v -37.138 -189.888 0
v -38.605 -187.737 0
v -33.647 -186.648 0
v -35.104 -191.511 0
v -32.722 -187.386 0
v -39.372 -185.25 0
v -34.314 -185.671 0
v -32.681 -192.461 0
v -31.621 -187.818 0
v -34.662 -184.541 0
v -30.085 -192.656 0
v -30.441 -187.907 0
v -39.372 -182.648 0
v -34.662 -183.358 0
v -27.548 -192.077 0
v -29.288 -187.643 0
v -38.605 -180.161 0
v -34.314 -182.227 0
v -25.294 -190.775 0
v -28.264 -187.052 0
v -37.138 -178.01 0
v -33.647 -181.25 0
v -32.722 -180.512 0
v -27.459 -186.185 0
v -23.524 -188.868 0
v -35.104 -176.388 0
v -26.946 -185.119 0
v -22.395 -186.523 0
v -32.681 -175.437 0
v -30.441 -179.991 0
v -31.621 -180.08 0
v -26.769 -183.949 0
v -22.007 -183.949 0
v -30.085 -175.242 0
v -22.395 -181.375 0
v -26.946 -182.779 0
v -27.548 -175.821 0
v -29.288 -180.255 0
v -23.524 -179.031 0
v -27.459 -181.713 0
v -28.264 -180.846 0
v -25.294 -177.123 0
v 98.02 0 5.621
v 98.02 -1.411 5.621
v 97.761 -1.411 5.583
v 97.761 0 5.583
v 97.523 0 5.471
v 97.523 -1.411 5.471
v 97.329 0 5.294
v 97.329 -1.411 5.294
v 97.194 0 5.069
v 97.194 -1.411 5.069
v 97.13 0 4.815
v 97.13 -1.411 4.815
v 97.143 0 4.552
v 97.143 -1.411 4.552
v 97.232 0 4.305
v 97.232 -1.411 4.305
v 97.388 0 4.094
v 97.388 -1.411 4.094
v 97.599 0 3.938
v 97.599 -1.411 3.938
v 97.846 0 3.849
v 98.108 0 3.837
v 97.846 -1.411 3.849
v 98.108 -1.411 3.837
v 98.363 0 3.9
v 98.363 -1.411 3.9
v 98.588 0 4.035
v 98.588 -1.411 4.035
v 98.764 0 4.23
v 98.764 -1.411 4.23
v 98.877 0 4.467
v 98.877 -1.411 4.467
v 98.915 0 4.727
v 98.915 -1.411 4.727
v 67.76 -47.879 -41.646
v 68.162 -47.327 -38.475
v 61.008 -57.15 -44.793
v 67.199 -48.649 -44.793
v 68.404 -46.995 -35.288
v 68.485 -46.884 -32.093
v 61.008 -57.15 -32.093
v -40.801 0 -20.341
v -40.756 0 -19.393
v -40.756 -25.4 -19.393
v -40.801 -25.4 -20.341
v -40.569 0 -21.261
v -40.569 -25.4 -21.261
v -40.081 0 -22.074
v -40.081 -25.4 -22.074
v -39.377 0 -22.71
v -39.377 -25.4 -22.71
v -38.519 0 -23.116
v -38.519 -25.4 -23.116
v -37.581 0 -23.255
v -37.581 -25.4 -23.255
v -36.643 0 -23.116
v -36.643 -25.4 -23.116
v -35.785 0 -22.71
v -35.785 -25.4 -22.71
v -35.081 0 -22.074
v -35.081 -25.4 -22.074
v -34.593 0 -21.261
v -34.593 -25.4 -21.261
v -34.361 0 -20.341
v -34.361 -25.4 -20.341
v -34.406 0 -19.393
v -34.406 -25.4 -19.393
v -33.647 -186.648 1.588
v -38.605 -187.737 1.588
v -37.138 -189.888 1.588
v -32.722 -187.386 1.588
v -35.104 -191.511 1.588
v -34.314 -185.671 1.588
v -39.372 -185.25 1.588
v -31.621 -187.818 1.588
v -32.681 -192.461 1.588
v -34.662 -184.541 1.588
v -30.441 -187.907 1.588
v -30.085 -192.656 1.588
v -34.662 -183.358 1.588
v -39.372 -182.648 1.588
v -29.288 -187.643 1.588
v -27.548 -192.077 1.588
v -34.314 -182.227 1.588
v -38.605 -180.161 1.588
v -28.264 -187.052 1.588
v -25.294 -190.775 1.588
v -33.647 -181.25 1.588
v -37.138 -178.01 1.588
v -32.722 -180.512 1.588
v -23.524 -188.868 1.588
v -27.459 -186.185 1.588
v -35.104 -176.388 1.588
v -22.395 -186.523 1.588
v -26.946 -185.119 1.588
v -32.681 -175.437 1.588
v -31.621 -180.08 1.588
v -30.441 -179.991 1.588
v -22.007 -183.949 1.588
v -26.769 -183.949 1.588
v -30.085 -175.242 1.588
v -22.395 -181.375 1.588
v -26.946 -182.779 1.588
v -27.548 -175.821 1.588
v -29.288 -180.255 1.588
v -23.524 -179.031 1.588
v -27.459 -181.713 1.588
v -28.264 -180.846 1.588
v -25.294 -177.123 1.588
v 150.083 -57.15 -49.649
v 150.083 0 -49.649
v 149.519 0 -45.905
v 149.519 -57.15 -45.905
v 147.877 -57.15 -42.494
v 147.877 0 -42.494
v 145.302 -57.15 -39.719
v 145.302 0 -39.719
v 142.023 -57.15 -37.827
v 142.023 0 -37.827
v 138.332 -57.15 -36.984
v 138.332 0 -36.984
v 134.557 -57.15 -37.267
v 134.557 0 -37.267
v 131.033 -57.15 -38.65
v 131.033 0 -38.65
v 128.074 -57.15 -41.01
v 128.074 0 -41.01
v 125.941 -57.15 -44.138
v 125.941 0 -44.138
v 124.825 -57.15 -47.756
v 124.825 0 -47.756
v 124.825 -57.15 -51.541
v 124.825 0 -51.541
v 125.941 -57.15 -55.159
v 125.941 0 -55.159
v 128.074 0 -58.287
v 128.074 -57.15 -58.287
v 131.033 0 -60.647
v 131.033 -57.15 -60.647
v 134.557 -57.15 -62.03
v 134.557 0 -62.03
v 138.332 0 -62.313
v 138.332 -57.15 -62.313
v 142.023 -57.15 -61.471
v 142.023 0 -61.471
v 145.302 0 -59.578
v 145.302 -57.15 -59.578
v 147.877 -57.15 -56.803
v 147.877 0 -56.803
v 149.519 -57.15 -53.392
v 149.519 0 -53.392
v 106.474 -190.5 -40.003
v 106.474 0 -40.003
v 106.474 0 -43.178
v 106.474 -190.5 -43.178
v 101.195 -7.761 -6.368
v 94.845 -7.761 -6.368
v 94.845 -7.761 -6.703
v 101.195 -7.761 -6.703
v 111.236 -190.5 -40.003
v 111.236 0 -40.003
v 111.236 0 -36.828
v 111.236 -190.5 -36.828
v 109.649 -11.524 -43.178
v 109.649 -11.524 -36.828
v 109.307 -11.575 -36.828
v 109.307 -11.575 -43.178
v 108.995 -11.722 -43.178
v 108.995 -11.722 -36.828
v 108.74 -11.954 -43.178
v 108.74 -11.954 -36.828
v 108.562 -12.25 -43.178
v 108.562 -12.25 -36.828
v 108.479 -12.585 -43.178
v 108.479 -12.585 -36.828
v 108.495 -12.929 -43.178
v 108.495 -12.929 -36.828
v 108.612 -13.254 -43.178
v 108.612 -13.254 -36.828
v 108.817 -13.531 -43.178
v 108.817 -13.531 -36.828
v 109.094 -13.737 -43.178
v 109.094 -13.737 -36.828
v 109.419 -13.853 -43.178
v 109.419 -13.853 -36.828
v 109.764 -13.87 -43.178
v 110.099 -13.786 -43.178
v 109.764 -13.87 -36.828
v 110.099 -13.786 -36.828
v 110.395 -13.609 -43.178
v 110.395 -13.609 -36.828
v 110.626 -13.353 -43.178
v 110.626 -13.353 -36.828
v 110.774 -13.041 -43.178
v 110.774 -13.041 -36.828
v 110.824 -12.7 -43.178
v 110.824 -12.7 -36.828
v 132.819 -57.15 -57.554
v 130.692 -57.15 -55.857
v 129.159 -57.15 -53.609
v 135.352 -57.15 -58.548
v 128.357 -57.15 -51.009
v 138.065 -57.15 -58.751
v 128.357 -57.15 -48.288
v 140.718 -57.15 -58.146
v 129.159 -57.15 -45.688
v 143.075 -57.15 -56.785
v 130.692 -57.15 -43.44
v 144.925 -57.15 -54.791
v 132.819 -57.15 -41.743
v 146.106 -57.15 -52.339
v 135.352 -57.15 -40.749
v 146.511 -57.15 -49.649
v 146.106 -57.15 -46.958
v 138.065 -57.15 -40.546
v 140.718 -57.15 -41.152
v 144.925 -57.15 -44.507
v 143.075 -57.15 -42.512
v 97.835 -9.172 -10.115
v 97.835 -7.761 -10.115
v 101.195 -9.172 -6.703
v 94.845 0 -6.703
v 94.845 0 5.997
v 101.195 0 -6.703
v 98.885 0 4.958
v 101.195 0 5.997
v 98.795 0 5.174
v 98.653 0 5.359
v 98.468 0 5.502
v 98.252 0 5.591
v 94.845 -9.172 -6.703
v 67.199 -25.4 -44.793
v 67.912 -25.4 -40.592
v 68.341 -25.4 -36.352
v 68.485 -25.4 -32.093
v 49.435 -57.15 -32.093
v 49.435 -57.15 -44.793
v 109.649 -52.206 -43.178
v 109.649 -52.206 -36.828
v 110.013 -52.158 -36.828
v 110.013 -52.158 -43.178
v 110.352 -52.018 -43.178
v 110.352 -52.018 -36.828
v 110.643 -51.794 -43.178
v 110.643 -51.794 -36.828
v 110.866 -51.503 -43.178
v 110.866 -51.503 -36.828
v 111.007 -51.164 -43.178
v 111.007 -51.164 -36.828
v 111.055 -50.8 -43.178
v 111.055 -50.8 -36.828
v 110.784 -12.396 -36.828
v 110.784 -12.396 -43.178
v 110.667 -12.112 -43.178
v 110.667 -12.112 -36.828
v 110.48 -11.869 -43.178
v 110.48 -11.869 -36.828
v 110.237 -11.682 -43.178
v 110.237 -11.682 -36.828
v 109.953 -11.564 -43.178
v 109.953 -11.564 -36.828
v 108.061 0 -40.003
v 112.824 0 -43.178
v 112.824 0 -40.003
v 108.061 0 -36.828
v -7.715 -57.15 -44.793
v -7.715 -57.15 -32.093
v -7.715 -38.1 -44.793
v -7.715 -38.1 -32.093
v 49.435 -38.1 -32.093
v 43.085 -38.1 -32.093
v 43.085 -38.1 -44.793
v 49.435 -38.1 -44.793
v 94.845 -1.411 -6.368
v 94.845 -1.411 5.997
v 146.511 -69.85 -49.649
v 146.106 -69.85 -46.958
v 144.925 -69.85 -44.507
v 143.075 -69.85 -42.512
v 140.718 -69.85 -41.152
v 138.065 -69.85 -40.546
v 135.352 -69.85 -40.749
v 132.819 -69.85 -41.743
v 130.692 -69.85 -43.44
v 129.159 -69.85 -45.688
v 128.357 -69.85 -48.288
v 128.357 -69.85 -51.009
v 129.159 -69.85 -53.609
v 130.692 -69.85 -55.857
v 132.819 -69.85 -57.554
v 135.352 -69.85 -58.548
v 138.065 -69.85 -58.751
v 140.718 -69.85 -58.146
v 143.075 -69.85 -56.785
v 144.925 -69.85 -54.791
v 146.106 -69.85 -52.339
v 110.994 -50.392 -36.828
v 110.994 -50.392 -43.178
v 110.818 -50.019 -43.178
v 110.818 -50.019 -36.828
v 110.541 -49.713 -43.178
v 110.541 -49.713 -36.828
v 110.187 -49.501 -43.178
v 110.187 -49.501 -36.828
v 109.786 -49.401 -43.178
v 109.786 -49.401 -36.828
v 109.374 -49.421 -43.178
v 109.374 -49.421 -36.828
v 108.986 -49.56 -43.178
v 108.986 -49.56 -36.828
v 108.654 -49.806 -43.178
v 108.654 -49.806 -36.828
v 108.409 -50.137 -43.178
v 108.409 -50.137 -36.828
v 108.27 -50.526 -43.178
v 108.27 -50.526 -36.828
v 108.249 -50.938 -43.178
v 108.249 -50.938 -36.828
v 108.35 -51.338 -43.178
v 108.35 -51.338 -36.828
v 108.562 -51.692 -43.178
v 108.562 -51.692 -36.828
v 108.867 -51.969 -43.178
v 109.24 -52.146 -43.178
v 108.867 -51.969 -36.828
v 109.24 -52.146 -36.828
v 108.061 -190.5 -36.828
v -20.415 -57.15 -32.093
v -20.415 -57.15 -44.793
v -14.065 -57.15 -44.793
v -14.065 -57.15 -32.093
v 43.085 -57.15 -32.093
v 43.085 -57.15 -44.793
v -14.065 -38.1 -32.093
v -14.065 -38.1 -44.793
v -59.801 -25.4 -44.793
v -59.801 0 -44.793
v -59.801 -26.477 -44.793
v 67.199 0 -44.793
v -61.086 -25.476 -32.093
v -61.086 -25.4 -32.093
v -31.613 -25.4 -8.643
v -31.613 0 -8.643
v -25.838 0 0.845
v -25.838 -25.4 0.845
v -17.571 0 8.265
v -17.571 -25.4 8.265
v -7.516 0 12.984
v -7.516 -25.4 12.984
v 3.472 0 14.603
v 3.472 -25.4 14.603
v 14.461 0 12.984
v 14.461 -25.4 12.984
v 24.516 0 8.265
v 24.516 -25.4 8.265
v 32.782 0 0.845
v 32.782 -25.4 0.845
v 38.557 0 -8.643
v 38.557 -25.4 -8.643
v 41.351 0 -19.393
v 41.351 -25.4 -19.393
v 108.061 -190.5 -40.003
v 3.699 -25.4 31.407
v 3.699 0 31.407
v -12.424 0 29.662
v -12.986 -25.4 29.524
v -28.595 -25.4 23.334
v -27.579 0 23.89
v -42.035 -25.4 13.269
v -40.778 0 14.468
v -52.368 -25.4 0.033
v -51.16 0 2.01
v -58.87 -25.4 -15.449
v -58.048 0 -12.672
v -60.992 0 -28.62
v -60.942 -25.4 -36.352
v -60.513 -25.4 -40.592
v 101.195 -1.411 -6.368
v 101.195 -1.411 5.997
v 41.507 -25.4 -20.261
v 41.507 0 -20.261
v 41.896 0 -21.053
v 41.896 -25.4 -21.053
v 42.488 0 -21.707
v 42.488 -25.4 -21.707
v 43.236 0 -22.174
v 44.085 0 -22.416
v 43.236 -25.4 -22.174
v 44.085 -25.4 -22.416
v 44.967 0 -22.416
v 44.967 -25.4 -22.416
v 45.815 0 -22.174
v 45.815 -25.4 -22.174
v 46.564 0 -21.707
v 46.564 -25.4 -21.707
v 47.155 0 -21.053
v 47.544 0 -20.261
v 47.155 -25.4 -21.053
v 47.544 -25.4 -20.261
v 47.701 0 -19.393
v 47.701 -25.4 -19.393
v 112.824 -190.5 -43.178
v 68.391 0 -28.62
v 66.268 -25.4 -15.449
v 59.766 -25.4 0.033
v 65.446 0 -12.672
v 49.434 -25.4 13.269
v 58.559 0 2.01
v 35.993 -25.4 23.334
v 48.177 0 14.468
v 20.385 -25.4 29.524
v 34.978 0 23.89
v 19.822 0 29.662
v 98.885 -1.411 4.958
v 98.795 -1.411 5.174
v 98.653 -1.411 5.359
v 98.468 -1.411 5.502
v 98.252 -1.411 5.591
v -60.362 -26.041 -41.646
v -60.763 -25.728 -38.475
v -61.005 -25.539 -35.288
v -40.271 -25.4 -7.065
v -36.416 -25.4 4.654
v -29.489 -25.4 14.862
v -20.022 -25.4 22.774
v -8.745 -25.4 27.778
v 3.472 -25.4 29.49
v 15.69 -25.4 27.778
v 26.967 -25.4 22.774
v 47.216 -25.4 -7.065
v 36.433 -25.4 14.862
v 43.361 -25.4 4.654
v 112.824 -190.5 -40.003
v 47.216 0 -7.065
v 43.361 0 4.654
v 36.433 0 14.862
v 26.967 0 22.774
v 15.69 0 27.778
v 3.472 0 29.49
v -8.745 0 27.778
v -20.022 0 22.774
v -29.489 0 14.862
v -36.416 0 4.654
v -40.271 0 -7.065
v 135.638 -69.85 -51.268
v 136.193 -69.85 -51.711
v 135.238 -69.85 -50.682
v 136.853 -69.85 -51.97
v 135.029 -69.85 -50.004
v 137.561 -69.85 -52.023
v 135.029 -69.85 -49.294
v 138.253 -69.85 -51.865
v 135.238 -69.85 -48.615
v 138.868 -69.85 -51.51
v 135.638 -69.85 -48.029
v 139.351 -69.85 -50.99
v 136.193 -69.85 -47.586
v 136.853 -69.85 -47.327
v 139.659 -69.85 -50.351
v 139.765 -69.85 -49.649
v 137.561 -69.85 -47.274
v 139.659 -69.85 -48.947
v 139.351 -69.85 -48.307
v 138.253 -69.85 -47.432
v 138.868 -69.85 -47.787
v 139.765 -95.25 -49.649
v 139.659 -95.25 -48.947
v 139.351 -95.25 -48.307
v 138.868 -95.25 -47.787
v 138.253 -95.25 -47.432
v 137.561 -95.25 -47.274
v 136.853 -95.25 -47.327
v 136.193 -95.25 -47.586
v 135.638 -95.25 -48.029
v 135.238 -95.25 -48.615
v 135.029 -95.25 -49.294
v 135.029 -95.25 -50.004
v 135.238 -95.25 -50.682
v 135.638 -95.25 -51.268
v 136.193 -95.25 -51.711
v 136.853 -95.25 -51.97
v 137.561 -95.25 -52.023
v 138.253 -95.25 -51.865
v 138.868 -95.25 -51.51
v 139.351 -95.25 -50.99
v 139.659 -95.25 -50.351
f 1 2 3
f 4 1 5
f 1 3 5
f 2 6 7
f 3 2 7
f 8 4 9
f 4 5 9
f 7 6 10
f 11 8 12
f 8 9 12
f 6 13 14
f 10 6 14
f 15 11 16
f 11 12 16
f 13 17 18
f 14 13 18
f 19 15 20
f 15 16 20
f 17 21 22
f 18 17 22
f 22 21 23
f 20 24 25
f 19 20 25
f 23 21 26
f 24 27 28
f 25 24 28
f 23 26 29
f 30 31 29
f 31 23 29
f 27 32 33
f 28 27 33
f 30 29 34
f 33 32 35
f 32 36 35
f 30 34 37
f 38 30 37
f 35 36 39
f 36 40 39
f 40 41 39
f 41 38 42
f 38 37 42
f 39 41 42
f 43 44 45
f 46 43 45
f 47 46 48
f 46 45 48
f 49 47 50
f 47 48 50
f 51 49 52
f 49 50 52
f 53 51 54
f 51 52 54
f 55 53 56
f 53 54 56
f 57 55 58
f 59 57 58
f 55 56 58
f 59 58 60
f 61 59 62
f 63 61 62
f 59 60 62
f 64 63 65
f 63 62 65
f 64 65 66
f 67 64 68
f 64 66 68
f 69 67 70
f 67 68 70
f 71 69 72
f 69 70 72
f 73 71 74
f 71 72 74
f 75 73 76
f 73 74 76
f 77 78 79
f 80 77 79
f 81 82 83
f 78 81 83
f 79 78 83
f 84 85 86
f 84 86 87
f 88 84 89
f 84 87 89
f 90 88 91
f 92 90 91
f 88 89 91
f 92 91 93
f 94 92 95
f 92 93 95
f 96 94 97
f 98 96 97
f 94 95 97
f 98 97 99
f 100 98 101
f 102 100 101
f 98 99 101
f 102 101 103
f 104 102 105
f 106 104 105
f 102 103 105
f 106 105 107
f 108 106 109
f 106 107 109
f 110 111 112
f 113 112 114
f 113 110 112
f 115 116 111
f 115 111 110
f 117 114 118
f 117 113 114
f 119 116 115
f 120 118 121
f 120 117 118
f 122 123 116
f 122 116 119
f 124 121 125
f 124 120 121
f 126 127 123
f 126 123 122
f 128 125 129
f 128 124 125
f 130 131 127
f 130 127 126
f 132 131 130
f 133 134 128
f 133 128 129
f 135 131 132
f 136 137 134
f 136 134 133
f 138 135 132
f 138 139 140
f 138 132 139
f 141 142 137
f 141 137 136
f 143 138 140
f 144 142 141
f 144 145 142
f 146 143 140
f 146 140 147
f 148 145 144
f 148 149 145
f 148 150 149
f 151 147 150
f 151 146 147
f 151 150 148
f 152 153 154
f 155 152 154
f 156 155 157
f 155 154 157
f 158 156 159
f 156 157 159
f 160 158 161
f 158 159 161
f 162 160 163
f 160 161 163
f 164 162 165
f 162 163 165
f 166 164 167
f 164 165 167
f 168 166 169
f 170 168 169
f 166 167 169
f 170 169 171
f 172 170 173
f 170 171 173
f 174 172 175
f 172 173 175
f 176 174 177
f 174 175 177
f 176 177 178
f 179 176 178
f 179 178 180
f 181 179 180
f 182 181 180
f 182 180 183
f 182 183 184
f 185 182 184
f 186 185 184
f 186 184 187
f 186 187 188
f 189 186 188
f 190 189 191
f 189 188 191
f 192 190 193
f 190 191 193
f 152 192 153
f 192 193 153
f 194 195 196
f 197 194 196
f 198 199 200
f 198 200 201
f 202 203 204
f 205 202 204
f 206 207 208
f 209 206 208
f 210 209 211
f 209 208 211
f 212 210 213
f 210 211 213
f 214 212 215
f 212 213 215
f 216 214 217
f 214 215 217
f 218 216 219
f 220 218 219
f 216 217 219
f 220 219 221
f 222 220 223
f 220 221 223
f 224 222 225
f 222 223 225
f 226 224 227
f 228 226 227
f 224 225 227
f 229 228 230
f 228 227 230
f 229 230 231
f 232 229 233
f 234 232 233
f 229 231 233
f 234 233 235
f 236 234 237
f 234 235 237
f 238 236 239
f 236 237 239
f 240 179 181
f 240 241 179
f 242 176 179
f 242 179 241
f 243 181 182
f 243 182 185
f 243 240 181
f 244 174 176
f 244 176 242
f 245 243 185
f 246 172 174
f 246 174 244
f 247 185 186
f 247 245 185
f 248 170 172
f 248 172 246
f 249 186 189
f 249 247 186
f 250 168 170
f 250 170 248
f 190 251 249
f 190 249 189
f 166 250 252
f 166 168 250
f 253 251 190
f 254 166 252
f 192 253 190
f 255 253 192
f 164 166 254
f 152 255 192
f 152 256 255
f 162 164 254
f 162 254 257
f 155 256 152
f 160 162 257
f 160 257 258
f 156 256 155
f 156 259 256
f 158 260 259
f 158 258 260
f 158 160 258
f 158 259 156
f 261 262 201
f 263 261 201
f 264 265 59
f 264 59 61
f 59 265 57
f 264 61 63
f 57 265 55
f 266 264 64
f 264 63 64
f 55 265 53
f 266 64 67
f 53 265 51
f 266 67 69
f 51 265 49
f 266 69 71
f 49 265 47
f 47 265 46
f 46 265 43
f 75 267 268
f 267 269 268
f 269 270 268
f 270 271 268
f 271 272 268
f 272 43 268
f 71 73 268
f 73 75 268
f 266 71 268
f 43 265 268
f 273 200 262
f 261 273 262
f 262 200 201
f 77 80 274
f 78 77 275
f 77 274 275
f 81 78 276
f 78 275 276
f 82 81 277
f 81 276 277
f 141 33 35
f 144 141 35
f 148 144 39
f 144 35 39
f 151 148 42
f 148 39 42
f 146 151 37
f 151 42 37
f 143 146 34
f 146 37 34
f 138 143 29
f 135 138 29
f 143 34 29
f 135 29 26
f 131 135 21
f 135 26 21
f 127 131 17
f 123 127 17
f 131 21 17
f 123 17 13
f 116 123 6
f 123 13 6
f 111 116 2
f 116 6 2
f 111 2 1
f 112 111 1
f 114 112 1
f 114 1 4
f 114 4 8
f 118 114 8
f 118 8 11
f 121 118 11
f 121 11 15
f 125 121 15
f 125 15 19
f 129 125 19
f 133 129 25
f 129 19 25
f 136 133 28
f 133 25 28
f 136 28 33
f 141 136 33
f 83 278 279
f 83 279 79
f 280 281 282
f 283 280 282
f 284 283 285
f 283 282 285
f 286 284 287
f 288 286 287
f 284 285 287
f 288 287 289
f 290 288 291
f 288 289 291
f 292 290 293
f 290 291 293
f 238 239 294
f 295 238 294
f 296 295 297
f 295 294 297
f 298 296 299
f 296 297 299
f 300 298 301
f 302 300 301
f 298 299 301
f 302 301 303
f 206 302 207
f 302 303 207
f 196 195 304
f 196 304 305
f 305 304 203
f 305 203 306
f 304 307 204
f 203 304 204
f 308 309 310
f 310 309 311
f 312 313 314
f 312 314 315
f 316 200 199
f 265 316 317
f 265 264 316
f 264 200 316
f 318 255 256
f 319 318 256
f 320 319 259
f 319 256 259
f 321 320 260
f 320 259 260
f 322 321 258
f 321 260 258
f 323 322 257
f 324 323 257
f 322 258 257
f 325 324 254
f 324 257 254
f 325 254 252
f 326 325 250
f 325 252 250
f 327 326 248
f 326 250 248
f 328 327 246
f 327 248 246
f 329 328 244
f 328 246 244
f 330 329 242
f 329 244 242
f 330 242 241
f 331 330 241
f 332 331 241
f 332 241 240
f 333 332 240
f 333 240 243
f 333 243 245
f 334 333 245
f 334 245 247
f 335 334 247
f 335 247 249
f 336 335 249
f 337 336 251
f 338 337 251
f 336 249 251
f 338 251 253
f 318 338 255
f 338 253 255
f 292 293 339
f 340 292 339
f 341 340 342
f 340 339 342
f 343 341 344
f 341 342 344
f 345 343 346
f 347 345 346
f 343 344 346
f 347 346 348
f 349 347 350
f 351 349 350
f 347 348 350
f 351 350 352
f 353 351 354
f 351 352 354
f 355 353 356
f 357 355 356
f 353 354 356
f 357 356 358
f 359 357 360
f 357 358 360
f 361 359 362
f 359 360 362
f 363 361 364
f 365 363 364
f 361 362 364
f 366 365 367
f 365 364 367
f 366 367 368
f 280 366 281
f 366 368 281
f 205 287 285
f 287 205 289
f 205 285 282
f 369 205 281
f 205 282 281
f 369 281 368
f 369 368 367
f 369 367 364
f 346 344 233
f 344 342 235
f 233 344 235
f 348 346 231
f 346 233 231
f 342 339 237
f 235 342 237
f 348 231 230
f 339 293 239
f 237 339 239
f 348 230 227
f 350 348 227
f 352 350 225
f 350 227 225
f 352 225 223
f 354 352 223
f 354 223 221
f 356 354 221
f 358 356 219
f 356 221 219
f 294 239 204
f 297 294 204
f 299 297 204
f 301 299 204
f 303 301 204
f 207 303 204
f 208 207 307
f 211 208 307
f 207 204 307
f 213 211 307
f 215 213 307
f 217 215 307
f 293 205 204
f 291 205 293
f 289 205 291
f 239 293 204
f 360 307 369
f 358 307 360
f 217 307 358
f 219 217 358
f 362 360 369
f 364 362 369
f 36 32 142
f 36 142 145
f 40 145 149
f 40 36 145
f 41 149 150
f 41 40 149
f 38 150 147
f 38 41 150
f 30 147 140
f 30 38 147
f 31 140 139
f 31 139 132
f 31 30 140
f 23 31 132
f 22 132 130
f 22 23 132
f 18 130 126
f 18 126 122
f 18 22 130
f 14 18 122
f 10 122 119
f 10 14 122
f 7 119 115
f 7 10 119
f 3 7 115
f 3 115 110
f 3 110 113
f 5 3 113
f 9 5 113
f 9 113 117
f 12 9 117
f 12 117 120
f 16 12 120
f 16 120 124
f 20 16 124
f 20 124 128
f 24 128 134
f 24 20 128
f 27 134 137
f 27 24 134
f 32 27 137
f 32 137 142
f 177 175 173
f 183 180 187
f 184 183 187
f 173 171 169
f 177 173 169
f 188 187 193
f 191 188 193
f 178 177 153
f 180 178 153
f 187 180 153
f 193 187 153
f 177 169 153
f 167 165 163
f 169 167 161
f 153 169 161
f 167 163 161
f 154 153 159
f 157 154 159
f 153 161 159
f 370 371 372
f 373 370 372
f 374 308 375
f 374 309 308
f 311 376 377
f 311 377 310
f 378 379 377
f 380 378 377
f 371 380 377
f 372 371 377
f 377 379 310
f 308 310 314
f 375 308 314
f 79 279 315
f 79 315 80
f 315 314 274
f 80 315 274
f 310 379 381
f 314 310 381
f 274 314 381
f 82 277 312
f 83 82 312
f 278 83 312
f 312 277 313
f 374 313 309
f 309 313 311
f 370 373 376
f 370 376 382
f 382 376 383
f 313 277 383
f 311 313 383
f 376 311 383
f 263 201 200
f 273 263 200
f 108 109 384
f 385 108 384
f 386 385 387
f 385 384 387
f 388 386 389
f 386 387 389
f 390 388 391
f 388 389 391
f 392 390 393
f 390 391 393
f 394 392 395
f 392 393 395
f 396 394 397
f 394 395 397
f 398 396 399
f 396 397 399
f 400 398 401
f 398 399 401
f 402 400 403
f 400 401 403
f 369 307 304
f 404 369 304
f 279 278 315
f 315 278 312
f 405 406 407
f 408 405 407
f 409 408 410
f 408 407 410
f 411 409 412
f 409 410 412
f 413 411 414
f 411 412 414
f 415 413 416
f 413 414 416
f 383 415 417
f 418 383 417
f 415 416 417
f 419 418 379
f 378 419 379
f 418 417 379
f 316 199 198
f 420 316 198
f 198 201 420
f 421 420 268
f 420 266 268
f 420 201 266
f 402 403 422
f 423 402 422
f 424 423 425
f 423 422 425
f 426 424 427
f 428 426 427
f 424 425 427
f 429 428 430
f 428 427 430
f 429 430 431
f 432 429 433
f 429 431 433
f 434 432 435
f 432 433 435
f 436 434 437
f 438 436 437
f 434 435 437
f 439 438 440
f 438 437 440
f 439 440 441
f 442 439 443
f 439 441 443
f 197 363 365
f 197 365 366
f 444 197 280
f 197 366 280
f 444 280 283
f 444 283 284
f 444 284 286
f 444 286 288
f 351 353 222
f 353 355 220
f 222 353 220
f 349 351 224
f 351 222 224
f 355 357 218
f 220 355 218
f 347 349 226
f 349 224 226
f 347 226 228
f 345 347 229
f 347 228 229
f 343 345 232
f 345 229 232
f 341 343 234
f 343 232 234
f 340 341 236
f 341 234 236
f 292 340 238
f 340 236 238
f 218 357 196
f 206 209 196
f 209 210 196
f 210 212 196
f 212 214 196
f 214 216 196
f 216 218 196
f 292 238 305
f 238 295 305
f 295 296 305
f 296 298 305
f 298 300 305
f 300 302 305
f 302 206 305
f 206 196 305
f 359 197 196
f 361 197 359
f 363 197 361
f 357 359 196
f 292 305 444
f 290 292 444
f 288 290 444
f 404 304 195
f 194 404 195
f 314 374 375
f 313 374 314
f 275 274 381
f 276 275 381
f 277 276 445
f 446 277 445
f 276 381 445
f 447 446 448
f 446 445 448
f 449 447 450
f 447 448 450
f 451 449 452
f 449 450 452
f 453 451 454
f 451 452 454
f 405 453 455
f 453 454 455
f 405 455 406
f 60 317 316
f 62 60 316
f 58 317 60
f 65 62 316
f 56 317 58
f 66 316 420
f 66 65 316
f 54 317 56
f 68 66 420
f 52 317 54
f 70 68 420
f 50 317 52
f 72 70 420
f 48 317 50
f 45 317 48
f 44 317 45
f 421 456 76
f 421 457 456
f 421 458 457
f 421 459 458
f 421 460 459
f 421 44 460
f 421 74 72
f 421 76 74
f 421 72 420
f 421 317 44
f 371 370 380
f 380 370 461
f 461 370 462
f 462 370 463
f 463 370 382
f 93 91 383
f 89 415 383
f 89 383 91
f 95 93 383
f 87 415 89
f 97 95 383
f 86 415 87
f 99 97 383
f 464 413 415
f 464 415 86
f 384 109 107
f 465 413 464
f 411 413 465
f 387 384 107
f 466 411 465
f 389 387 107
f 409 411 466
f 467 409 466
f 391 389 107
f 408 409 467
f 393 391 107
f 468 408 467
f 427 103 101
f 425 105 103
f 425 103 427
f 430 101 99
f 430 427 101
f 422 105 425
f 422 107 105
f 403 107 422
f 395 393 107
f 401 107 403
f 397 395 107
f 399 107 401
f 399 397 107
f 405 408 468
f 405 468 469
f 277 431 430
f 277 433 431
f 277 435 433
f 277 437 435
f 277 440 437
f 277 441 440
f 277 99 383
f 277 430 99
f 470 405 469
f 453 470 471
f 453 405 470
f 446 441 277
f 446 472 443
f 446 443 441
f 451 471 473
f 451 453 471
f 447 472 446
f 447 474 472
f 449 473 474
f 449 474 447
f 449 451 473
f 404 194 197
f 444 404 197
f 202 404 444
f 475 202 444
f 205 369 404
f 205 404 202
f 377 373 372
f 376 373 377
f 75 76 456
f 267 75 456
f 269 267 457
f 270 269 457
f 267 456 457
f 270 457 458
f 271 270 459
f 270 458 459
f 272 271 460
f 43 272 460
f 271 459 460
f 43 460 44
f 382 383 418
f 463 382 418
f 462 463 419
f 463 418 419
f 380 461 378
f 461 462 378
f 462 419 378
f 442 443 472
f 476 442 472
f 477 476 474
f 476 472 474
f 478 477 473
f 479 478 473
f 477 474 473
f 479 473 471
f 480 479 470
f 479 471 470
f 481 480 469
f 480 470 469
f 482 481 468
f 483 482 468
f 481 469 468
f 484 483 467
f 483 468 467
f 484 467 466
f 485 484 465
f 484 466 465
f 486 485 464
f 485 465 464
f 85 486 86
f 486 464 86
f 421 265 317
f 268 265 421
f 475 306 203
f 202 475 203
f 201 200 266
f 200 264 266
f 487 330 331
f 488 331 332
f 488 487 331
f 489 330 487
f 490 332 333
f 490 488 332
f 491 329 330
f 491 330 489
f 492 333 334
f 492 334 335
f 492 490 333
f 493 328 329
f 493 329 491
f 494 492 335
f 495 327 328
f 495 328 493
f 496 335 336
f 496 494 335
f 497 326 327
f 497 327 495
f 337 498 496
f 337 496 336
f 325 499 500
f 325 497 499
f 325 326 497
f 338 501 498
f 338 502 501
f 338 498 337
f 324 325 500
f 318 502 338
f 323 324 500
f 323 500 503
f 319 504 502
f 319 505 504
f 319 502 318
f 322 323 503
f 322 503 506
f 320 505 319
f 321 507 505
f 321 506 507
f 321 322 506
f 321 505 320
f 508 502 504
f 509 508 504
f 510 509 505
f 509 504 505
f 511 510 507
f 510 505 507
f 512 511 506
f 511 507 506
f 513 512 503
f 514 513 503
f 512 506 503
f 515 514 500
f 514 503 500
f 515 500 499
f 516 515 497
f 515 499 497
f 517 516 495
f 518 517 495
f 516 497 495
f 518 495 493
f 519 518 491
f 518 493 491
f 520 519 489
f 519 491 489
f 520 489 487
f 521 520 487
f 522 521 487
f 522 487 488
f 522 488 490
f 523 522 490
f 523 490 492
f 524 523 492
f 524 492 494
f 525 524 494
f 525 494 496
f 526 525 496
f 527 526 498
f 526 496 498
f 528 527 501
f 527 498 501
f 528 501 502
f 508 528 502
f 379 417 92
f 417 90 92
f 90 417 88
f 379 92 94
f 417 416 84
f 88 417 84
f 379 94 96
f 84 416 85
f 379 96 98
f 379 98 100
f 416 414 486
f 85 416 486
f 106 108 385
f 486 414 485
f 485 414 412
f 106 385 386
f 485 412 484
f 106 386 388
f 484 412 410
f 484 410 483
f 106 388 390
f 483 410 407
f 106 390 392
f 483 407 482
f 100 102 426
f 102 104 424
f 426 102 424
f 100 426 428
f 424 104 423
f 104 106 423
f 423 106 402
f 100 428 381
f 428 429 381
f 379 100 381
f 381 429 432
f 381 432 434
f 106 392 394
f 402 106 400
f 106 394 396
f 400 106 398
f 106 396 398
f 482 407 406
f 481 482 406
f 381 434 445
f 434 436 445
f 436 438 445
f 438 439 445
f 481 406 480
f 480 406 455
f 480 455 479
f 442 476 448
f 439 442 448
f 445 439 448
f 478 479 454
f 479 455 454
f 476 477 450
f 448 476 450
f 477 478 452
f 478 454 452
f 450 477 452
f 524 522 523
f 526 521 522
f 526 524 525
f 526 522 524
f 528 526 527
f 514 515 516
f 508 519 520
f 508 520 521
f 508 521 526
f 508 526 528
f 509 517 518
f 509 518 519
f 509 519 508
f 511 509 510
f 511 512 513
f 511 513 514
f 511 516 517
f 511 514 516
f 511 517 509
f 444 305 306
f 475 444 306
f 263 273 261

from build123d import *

# Parameters (mm, degrees)
F1_DEPTH  = 25.4
F3_DEPTH  = 31.75
F4_W      = 6.35
F4_H      = 19.05
F5_DEPTH  = 25.4
F7_DEPTH  = 25.4
F9_DEPTH  = 190.5
F11_DEPTH = 25.4
F13_DEPTH = 25.4
F14_R     = 12.7
F15_DEPTH = 57.15
F16_R     = 9.128125
F17_DEPTH = 12.7
F18_R     = 2.38125
F19_DEPTH = 25.4
F21_DEPTH = 25.4
F22_R     = 8.73125
F22_R_2   = 3.96875
F23_DEPTH = 1.5875
F24_W     = 6.35
F24_H     = 12.7
F25_DEPTH = 1.4111111111
F26_W     = 6.35
F26_H     = 0.3355476074
F27_DEPTH = 6.35
F29_DEPTH = 1.4111111111
F31_DEPTH = 25.4
F33_DEPTH = 25.4


with BuildPart() as f1:
    # F0 (on Front) → F1 (new body)
    with BuildSketch(Plane.XZ):
        with BuildLine():
            ThreePointArc((3.6992596686, 31.4069082856), (-46.3684103417, 8.5716332942), (-59.8007403314, -44.7930917144))
            Line((-59.8007403314, -44.7930917144), (3.6992596686, -44.7930917144))
            Line((3.6992596686, -44.7930917144), (3.6992596686, 31.4069082856))
        make_face()
        with BuildLine():
            Line((3.6992596686, 31.4069082856), (3.6992596686, -44.7930917144))
            Line((3.6992596686, -44.7930917144), (67.1992596686, -44.7930917144))
            ThreePointArc((67.1992596686, -44.7930917144), (53.7669296789, 8.5716332942), (3.6992596686, 31.4069082856))
        make_face()
    extrude(amount=F1_DEPTH)

    # F2 (on face) → F3 (join)
    with BuildSketch(Plane.XZ.offset(25.4)):
        with BuildLine():
            Line((3.6992596686, -32.0930917144), (3.6992596686, -44.7930917144))
            Line((3.6992596686, -44.7930917144), (67.1992596686, -44.7930917144))
            ThreePointArc((67.1992596686, -44.7930917144), (68.162001096, -38.4754784131), (68.4848770905, -32.0930917144))
            Line((68.4848770905, -32.0930917144), (3.6992596686, -32.0930917144))
        make_face()
        with BuildLine():
            Line((-59.8007403314, -44.7930917144), (3.6992596686, -44.7930917144))
            Line((3.6992596686, -44.7930917144), (3.6992596686, -32.0930917144))
            Line((3.6992596686, -32.0930917144), (-61.0863577533, -32.0930917144))
            ThreePointArc((-61.0863577533, -32.0930917144), (-60.7634817588, -38.4754784131), (-59.8007403314, -44.7930917144))
        make_face()
    extrude(amount=F3_DEPTH)

    # F4 (on face) → F5 (cut)
    with BuildSketch(Plane.XY.offset(-32.0930917144)):
        with Locations((-10.8901229095, -47.625)):
            Rectangle(F4_W, F4_H)
        with Locations((46.2598770905, -47.625)):
            Rectangle(F4_W, F4_H)
    extrude(amount=-F5_DEPTH, mode=Mode.SUBTRACT)

    # F6 (on face) → F7 (cut)
    with BuildSketch(Plane.XY.offset(-32.0930917144)):
        Polygon((-61.0863577533, -57.15), (-20.4151229095, -57.15), (-61.0863577533, -25.4762284458), align=None)
    extrude(amount=-F7_DEPTH, mode=Mode.SUBTRACT)

    # F10 (on face) → F11 (cut)
    with BuildSketch(Plane.XZ.offset(25.4)):
        with BuildLine():
            ThreePointArc((-34.4060539402, -19.3930917144), (3.4723236964, 14.6034332195), (41.3507013331, -19.3930917144))
            ThreePointArc((41.3507013331, -19.3930917144), (44.5257013331, -22.4471894102), (47.7007013331, -19.3930917144))
            ThreePointArc((47.7007013331, -19.3930917144), (3.4723236964, 29.4900912993), (-40.7560539402, -19.3930917144))
            ThreePointArc((-40.7560539402, -19.3930917144), (-37.5810539402, -23.2547456735), (-34.4060539402, -19.3930917144))
        make_face()
    extrude(amount=-F11_DEPTH, mode=Mode.SUBTRACT)

    # F12 (on face) → F13 (cut)
    with BuildSketch(Plane.XY.offset(-32.0930917144)):
        Polygon((68.4848770905, -46.8841094878), (61.0081470571, -57.15), (68.4848770905, -57.15), align=None)
    extrude(amount=-F13_DEPTH, mode=Mode.SUBTRACT)


with BuildPart() as f9:
    # F8 (on Front) → F9 (new body)
    with BuildSketch(Plane.XZ):
        Polygon((106.4736619592, -40.0025413454), (106.4736619592, -43.1775413454), (112.8236619592, -43.1775413454), (112.8236619592, -40.0025413454), (111.2361619592, -40.0025413454), (111.2361619592, -36.8275413454), (108.0611619592, -36.8275413454), (108.0611619592, -40.0025413454), align=None)
    extrude(amount=F9_DEPTH)

    # F20 (on face) → F21 (cut)
    with BuildSketch(Plane.XY.offset(-36.8275413454)):
        with BuildLine():
            ThreePointArc((111.0547976237, -50.8), (108.6543738955, -49.8057119363), (109.6486619592, -52.2061356645))
            ThreePointArc((109.6486619592, -52.2061356645), (110.6429500228, -51.7942880637), (111.0547976237, -50.8))
        make_face()
    extrude(amount=-F21_DEPTH, mode=Mode.SUBTRACT)

    # F32 (on face) → F33 (cut)
    with BuildSketch(Plane.XY.offset(-36.8275413454)):
        with BuildLine():
            ThreePointArc((110.8244292644, -12.7), (110.4800549938, -11.8686069654), (109.6486619592, -11.5242326948))
            ThreePointArc((109.6486619592, -11.5242326948), (108.8172689246, -13.5313930346), (110.8244292644, -12.7))
        make_face()
    extrude(amount=-F33_DEPTH, mode=Mode.SUBTRACT)


with BuildPart() as f15:
    # F14 (on Front) → F15 (new body)
    with BuildSketch(Plane.XZ):
        with Locations((137.3832821846, -49.6486574411)):
            Circle(F14_R)
    extrude(amount=F15_DEPTH)

    # F16 (on face) → F17 (join)
    with BuildSketch(Plane.XZ.offset(57.15)):
        with Locations((137.3832821846, -49.6486574411)):
            Circle(F16_R)
    extrude(amount=F17_DEPTH)

    # F18 (on face) → F19 (join)
    with BuildSketch(Plane.XZ.offset(69.85)):
        with Locations((137.3832821846, -49.6486574411)):
            Circle(F18_R)
    extrude(amount=F19_DEPTH)


with BuildPart() as f23:
    # F22 (on Top) → F23 (new body)
    with BuildSketch(Plane.XY):
        with Locations((-30.7379812002, -183.9490532875)):
            Circle(F22_R)
        with Locations((-30.7379812002, -183.9490532875)):
            Circle(F22_R_2, mode=Mode.SUBTRACT)
    extrude(amount=F23_DEPTH)


with BuildPart() as f25:
    # F24 (on Front) → F25 (new body)
    with BuildSketch(Plane.XZ):
        with Locations((98.0204886675, -0.3531546496)):
            Rectangle(F24_W, F24_H)
    extrude(amount=F25_DEPTH)

    # F26 (on face) → F27 (join)
    with BuildSketch(Plane.XZ.offset(1.4111111111)):
        with Locations((98.0204886675, -6.5353808459)):
            Rectangle(F26_W, F26_H)
    extrude(amount=F27_DEPTH)

    # F30 (on face) → F31 (cut)
    with BuildSketch(Plane.XZ.offset(1.4111111111)):
        with BuildLine():
            ThreePointArc((98.9151056661, 4.7268453504), (98.6530784137, 5.3594350967), (98.0204886675, 5.621462349))
            ThreePointArc((98.0204886675, 5.621462349), (97.3878989212, 4.0942556042), (98.9151056661, 4.7268453504))
        make_face()
    extrude(amount=-F31_DEPTH, mode=Mode.SUBTRACT)


with BuildPart() as f29:
    # F28 (on face) → F29 (new body)
    with BuildSketch(Plane.XZ.offset(7.7611111111)):
        Polygon((101.1954886675, -6.7031546496), (94.8454886675, -6.7031546496), (97.8352725506, -10.1154381409), align=None)
    extrude(amount=F29_DEPTH)


solid = Compound([f1.part, f9.part, f15.part, f23.part, f25.part, f29.part])
